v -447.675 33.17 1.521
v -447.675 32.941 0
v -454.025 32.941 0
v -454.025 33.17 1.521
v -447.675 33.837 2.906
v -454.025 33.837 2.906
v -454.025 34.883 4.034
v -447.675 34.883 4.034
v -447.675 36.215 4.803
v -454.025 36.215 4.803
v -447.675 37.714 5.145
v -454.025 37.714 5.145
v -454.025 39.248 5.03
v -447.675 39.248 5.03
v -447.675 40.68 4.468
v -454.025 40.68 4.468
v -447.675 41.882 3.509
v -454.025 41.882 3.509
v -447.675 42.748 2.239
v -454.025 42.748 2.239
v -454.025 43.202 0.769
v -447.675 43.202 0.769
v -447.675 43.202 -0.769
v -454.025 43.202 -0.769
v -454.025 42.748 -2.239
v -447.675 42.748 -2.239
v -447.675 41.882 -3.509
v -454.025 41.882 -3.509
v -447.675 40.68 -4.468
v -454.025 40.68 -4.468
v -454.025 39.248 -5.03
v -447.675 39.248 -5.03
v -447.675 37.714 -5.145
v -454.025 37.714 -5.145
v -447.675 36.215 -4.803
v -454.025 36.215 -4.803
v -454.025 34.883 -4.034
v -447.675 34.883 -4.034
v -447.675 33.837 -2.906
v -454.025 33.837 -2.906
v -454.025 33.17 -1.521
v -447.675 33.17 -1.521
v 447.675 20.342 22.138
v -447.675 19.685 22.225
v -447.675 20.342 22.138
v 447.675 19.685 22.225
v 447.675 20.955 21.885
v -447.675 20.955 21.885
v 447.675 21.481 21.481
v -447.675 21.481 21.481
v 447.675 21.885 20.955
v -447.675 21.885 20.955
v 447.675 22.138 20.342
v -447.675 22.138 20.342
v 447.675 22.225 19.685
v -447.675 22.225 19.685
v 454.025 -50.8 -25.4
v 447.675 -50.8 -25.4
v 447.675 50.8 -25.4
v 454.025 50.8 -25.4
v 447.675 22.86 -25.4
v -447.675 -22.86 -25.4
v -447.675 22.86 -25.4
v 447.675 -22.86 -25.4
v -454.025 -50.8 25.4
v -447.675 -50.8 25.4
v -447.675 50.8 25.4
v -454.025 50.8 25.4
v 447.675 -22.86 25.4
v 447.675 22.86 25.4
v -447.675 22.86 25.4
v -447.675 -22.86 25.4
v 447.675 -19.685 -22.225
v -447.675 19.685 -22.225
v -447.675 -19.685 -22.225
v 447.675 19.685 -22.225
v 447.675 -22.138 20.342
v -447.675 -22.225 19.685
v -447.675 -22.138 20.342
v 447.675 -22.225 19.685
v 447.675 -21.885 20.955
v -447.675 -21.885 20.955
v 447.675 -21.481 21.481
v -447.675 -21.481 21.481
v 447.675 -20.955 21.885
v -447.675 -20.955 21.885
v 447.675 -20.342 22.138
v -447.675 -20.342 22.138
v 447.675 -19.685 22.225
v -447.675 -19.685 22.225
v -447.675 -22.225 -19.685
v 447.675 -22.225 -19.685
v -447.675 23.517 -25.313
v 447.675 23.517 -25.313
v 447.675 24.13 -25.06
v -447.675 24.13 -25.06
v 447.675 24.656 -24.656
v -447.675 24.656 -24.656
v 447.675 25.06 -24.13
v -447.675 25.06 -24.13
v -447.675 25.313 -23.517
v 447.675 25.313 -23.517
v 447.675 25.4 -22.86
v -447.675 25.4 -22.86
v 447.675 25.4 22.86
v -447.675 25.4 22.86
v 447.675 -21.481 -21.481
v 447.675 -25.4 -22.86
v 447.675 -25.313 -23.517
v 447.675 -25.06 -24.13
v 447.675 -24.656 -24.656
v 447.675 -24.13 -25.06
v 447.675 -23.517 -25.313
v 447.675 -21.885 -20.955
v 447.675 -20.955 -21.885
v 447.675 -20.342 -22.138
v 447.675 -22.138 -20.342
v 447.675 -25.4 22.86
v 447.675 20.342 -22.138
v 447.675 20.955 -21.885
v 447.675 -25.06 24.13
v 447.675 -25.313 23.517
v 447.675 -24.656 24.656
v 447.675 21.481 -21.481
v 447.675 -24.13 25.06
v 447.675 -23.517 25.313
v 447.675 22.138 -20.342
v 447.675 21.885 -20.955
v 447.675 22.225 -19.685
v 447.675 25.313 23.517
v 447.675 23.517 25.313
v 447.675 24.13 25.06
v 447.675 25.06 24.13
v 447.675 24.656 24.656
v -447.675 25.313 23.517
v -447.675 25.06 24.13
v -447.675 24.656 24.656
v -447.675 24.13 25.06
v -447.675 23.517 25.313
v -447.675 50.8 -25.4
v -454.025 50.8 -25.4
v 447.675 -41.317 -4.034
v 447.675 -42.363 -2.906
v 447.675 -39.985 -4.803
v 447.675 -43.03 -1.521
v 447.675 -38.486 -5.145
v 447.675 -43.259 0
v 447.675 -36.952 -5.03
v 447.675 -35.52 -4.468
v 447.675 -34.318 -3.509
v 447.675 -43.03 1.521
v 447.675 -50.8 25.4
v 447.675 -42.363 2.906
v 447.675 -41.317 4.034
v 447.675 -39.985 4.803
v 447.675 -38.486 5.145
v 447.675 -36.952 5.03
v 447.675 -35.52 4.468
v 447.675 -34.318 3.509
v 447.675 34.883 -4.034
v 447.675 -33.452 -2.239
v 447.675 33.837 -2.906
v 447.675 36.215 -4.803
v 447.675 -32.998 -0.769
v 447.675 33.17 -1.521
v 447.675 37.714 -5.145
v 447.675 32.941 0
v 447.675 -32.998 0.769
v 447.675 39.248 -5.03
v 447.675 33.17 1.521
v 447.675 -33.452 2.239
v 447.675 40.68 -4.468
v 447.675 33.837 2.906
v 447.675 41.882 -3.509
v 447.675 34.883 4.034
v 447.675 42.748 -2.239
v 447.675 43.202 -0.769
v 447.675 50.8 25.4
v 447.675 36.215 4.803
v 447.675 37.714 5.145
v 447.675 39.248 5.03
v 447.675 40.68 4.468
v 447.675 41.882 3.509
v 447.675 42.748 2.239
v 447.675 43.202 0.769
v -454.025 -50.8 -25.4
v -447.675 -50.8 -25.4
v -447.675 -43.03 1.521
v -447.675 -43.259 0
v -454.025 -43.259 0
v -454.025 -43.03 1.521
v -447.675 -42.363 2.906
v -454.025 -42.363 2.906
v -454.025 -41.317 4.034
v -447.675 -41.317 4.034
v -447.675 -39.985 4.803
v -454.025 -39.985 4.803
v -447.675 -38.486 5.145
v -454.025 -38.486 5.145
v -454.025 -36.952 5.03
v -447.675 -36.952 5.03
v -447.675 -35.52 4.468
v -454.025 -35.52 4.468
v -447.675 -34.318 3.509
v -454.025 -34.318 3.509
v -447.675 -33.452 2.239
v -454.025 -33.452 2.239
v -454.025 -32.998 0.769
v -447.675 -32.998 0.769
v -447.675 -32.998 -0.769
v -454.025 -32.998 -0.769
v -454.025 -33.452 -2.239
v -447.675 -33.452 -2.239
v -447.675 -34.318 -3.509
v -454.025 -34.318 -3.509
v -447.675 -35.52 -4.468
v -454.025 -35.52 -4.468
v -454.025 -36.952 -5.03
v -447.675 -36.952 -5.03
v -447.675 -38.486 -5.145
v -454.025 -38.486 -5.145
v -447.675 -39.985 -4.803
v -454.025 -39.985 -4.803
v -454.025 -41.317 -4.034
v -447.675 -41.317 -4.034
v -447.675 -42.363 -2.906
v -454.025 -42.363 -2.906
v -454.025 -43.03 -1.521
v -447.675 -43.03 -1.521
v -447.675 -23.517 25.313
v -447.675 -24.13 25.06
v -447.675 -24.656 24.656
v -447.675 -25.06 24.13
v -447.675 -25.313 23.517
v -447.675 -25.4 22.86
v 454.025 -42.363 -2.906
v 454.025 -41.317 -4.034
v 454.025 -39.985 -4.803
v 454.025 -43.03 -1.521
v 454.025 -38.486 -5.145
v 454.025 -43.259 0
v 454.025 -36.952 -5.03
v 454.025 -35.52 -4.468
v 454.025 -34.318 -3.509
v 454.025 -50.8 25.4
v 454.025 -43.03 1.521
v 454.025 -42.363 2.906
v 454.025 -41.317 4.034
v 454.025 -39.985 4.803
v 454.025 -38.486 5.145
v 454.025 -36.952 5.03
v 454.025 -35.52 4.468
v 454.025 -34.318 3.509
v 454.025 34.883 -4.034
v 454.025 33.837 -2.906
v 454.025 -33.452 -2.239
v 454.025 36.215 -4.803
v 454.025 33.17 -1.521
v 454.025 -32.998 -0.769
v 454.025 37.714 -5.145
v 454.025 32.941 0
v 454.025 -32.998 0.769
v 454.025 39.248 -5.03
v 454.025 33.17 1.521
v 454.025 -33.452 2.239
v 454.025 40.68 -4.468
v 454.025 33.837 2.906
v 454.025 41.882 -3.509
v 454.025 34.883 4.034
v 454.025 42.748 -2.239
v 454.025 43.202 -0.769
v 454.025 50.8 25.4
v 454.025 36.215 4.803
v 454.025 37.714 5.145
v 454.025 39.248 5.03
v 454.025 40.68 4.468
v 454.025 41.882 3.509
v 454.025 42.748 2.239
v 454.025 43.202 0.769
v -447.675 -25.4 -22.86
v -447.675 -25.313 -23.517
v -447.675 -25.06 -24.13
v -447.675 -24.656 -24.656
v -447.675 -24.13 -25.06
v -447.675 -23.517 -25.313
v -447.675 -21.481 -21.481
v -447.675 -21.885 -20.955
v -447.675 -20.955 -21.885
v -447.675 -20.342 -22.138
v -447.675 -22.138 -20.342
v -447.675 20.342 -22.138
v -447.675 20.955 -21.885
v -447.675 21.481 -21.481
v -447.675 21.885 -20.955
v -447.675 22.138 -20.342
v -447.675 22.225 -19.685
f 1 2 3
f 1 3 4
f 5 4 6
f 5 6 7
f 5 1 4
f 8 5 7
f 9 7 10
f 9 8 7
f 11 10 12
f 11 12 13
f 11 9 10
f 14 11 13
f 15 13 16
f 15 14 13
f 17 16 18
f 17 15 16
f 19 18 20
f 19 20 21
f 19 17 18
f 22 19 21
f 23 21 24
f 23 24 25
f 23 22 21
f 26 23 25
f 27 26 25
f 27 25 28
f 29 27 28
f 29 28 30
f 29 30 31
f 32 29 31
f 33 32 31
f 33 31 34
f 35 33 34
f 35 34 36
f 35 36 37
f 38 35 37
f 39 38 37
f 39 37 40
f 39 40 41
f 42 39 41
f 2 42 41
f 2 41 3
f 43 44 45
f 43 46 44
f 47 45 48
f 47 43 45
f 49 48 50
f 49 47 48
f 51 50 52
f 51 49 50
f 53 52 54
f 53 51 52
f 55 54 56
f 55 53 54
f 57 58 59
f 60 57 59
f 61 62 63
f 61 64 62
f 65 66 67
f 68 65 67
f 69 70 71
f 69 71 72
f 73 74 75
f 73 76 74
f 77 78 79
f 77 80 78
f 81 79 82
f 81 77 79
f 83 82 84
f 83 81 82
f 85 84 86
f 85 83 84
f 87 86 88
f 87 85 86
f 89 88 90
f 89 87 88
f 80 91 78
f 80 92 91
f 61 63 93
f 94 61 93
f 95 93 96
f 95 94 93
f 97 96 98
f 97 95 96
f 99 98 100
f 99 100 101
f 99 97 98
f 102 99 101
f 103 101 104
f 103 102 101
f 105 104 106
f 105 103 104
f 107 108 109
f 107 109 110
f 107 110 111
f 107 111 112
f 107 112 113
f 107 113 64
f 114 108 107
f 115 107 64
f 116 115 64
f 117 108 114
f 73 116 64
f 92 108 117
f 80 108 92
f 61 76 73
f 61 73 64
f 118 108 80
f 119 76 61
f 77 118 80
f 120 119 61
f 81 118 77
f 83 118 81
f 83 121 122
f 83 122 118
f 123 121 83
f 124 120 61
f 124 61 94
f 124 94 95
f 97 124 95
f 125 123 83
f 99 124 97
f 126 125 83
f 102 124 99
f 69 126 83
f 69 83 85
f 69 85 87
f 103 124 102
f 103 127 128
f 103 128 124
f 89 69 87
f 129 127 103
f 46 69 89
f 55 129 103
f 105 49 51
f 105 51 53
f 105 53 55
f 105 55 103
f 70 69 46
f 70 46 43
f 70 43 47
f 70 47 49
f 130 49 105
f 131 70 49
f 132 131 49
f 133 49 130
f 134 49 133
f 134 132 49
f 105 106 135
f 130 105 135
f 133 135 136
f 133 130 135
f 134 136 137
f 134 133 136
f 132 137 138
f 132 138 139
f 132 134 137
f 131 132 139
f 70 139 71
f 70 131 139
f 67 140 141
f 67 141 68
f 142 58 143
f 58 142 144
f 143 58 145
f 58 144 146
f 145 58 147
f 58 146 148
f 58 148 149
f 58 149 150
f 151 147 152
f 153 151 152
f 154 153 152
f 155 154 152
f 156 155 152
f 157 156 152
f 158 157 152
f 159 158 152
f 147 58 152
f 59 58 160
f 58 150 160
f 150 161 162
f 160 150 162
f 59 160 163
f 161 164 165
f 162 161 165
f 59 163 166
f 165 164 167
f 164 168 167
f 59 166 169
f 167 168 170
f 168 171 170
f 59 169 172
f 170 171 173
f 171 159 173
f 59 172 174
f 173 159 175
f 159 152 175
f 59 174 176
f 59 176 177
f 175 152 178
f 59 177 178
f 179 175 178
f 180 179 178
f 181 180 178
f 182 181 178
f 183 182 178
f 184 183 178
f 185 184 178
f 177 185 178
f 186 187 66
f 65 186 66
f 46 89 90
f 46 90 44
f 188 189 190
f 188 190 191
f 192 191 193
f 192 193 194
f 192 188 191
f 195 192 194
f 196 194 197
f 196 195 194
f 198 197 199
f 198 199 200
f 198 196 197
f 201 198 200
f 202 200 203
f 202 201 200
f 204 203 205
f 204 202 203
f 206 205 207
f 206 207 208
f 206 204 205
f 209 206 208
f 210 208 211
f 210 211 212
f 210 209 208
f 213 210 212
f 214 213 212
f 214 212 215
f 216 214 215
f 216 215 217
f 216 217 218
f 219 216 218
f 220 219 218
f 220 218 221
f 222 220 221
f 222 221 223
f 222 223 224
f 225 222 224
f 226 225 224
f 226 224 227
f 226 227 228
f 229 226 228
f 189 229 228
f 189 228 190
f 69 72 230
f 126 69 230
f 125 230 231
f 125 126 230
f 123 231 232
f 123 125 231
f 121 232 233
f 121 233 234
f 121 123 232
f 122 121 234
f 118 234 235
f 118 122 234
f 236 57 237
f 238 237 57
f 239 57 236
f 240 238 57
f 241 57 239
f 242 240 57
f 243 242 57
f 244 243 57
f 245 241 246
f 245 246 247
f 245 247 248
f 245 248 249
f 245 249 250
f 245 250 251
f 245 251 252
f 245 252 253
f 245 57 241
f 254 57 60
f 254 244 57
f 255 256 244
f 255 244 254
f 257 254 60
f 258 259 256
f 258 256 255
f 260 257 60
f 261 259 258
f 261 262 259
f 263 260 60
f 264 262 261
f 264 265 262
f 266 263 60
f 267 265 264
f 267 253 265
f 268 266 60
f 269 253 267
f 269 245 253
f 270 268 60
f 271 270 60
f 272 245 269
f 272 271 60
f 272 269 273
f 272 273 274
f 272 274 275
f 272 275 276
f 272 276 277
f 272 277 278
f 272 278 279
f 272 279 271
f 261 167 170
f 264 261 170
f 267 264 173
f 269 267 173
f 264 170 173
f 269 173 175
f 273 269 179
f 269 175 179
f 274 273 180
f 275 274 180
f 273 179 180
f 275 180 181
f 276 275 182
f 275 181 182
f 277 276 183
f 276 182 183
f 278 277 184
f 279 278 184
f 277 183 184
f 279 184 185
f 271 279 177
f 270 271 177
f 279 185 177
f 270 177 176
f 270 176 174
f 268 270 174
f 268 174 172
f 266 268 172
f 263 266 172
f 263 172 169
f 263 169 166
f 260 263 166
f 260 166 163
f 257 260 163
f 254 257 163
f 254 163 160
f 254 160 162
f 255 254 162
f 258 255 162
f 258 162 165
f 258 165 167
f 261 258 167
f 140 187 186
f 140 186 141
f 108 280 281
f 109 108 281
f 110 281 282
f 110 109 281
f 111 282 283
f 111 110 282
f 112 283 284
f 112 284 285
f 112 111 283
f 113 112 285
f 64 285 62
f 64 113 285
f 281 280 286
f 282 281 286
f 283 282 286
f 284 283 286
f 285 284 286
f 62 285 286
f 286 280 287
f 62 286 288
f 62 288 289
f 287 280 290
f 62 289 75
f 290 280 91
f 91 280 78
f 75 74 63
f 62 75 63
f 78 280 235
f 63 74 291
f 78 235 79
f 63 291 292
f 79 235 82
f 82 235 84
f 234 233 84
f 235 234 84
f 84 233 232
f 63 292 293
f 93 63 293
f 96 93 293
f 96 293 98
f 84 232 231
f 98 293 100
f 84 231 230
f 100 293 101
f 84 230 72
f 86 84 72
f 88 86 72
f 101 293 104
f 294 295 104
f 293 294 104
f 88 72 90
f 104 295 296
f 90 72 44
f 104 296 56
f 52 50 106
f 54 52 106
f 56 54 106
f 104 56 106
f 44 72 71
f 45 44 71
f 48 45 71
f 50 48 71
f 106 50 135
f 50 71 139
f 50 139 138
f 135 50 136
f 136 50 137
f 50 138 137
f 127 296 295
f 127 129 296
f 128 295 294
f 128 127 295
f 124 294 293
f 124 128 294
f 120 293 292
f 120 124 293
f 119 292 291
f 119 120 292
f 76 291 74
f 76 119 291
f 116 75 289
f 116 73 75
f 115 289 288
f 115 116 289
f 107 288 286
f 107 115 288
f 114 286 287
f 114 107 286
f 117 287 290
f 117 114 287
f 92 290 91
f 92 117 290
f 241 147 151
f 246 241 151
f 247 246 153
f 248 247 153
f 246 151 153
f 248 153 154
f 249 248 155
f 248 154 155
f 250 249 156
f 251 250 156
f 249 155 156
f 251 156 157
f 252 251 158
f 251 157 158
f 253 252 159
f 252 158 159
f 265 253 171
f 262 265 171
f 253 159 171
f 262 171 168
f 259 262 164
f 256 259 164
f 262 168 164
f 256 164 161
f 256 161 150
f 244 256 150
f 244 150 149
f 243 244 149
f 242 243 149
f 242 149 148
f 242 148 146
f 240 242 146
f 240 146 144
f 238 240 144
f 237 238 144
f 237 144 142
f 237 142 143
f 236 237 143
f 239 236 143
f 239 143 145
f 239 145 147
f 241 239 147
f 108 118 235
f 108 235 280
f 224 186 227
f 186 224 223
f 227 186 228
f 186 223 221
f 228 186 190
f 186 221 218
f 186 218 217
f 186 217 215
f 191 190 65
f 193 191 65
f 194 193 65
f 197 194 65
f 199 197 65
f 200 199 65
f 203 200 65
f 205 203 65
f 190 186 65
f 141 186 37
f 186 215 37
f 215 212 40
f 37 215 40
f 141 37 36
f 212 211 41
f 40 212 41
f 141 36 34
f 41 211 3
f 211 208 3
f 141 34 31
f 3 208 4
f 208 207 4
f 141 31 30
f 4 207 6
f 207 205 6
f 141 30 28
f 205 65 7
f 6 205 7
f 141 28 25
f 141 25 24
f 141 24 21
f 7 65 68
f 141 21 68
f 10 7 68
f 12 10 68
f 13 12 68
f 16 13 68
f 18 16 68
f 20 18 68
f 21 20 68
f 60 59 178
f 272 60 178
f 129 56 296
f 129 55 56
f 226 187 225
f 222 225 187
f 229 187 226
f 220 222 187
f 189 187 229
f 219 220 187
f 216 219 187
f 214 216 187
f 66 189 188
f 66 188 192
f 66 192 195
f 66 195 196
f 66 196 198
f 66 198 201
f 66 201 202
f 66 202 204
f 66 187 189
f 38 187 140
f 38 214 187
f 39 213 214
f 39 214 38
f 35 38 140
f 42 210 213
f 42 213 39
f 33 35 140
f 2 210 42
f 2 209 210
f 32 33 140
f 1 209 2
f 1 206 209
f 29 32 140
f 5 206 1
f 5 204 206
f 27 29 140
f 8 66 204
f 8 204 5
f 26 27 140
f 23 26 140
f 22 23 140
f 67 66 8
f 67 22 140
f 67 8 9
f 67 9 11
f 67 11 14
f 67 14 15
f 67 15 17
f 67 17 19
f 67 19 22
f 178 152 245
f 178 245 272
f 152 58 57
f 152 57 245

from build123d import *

# Parameters (mm, degrees)
F1_DEPTH = 447.675
F2_W     = 101.6
F2_H     = 50.8
F3_DEPTH = 6.35
F5_D     = 10.31875


# Not quite as in the source:
# - a length typed as a fraction of an inch, garbled in the dataset ("3 / 203.2 mm" for 3/8 in), is restored


with BuildPart() as f1:
    # F0 (on Right) → F1 (new body, symmetric)
    with BuildSketch(Plane.YZ):
        with BuildLine():
            ThreePointArc((25.4, 22.86), (24.6560512242, 24.6560512242), (22.86, 25.4))
            Line((22.86, 25.4), (-22.86, 25.4))
            ThreePointArc((-22.86, 25.4), (-24.6560512242, 24.6560512242), (-25.4, 22.86))
            Line((-25.4, 22.86), (-25.4, -22.86))
            ThreePointArc((-25.4, -22.86), (-24.6560512242, -24.6560512242), (-22.86, -25.4))
            Line((-22.86, -25.4), (22.86, -25.4))
            ThreePointArc((22.86, -25.4), (24.6560512242, -24.6560512242), (25.4, -22.86))
            Line((25.4, -22.86), (25.4, 22.86))
        make_face()
        with BuildLine():
            Line((-19.685, 22.225), (19.685, 22.225))
            ThreePointArc((19.685, 22.225), (21.4810512242, 21.4810512242), (22.225, 19.685))
            Line((22.225, 19.685), (22.225, -19.685))
            ThreePointArc((22.225, -19.685), (21.4810512242, -21.4810512242), (19.685, -22.225))
            Line((19.685, -22.225), (-19.685, -22.225))
            ThreePointArc((-19.685, -22.225), (-21.4810512242, -21.4810512242), (-22.225, -19.685))
            Line((-22.225, -19.685), (-22.225, 19.685))
            ThreePointArc((-22.225, 19.685), (-21.4810512242, 21.4810512242), (-19.685, 22.225))
        make_face(mode=Mode.SUBTRACT)
    extrude(amount=F1_DEPTH, both=True)


with BuildPart() as f3:
    # F2 (on face) → F3 (new body)
    with BuildSketch(Plane.YZ.offset(447.675)):
        Rectangle(F2_W, F2_H)
    extrude(amount=F3_DEPTH)

    # F5 (through all)
    with Locations(Plane.YZ.offset(454.025)):
        with Locations((-38.1, 0), (38.1, 0)):
            Hole(F5_D / 2)


with BuildPart() as f6_1:
    # F6: instance of F3
    add(f3.part.mirror(Plane.YZ))


solid = Compound([f1.part, f3.part, f6_1.part])
